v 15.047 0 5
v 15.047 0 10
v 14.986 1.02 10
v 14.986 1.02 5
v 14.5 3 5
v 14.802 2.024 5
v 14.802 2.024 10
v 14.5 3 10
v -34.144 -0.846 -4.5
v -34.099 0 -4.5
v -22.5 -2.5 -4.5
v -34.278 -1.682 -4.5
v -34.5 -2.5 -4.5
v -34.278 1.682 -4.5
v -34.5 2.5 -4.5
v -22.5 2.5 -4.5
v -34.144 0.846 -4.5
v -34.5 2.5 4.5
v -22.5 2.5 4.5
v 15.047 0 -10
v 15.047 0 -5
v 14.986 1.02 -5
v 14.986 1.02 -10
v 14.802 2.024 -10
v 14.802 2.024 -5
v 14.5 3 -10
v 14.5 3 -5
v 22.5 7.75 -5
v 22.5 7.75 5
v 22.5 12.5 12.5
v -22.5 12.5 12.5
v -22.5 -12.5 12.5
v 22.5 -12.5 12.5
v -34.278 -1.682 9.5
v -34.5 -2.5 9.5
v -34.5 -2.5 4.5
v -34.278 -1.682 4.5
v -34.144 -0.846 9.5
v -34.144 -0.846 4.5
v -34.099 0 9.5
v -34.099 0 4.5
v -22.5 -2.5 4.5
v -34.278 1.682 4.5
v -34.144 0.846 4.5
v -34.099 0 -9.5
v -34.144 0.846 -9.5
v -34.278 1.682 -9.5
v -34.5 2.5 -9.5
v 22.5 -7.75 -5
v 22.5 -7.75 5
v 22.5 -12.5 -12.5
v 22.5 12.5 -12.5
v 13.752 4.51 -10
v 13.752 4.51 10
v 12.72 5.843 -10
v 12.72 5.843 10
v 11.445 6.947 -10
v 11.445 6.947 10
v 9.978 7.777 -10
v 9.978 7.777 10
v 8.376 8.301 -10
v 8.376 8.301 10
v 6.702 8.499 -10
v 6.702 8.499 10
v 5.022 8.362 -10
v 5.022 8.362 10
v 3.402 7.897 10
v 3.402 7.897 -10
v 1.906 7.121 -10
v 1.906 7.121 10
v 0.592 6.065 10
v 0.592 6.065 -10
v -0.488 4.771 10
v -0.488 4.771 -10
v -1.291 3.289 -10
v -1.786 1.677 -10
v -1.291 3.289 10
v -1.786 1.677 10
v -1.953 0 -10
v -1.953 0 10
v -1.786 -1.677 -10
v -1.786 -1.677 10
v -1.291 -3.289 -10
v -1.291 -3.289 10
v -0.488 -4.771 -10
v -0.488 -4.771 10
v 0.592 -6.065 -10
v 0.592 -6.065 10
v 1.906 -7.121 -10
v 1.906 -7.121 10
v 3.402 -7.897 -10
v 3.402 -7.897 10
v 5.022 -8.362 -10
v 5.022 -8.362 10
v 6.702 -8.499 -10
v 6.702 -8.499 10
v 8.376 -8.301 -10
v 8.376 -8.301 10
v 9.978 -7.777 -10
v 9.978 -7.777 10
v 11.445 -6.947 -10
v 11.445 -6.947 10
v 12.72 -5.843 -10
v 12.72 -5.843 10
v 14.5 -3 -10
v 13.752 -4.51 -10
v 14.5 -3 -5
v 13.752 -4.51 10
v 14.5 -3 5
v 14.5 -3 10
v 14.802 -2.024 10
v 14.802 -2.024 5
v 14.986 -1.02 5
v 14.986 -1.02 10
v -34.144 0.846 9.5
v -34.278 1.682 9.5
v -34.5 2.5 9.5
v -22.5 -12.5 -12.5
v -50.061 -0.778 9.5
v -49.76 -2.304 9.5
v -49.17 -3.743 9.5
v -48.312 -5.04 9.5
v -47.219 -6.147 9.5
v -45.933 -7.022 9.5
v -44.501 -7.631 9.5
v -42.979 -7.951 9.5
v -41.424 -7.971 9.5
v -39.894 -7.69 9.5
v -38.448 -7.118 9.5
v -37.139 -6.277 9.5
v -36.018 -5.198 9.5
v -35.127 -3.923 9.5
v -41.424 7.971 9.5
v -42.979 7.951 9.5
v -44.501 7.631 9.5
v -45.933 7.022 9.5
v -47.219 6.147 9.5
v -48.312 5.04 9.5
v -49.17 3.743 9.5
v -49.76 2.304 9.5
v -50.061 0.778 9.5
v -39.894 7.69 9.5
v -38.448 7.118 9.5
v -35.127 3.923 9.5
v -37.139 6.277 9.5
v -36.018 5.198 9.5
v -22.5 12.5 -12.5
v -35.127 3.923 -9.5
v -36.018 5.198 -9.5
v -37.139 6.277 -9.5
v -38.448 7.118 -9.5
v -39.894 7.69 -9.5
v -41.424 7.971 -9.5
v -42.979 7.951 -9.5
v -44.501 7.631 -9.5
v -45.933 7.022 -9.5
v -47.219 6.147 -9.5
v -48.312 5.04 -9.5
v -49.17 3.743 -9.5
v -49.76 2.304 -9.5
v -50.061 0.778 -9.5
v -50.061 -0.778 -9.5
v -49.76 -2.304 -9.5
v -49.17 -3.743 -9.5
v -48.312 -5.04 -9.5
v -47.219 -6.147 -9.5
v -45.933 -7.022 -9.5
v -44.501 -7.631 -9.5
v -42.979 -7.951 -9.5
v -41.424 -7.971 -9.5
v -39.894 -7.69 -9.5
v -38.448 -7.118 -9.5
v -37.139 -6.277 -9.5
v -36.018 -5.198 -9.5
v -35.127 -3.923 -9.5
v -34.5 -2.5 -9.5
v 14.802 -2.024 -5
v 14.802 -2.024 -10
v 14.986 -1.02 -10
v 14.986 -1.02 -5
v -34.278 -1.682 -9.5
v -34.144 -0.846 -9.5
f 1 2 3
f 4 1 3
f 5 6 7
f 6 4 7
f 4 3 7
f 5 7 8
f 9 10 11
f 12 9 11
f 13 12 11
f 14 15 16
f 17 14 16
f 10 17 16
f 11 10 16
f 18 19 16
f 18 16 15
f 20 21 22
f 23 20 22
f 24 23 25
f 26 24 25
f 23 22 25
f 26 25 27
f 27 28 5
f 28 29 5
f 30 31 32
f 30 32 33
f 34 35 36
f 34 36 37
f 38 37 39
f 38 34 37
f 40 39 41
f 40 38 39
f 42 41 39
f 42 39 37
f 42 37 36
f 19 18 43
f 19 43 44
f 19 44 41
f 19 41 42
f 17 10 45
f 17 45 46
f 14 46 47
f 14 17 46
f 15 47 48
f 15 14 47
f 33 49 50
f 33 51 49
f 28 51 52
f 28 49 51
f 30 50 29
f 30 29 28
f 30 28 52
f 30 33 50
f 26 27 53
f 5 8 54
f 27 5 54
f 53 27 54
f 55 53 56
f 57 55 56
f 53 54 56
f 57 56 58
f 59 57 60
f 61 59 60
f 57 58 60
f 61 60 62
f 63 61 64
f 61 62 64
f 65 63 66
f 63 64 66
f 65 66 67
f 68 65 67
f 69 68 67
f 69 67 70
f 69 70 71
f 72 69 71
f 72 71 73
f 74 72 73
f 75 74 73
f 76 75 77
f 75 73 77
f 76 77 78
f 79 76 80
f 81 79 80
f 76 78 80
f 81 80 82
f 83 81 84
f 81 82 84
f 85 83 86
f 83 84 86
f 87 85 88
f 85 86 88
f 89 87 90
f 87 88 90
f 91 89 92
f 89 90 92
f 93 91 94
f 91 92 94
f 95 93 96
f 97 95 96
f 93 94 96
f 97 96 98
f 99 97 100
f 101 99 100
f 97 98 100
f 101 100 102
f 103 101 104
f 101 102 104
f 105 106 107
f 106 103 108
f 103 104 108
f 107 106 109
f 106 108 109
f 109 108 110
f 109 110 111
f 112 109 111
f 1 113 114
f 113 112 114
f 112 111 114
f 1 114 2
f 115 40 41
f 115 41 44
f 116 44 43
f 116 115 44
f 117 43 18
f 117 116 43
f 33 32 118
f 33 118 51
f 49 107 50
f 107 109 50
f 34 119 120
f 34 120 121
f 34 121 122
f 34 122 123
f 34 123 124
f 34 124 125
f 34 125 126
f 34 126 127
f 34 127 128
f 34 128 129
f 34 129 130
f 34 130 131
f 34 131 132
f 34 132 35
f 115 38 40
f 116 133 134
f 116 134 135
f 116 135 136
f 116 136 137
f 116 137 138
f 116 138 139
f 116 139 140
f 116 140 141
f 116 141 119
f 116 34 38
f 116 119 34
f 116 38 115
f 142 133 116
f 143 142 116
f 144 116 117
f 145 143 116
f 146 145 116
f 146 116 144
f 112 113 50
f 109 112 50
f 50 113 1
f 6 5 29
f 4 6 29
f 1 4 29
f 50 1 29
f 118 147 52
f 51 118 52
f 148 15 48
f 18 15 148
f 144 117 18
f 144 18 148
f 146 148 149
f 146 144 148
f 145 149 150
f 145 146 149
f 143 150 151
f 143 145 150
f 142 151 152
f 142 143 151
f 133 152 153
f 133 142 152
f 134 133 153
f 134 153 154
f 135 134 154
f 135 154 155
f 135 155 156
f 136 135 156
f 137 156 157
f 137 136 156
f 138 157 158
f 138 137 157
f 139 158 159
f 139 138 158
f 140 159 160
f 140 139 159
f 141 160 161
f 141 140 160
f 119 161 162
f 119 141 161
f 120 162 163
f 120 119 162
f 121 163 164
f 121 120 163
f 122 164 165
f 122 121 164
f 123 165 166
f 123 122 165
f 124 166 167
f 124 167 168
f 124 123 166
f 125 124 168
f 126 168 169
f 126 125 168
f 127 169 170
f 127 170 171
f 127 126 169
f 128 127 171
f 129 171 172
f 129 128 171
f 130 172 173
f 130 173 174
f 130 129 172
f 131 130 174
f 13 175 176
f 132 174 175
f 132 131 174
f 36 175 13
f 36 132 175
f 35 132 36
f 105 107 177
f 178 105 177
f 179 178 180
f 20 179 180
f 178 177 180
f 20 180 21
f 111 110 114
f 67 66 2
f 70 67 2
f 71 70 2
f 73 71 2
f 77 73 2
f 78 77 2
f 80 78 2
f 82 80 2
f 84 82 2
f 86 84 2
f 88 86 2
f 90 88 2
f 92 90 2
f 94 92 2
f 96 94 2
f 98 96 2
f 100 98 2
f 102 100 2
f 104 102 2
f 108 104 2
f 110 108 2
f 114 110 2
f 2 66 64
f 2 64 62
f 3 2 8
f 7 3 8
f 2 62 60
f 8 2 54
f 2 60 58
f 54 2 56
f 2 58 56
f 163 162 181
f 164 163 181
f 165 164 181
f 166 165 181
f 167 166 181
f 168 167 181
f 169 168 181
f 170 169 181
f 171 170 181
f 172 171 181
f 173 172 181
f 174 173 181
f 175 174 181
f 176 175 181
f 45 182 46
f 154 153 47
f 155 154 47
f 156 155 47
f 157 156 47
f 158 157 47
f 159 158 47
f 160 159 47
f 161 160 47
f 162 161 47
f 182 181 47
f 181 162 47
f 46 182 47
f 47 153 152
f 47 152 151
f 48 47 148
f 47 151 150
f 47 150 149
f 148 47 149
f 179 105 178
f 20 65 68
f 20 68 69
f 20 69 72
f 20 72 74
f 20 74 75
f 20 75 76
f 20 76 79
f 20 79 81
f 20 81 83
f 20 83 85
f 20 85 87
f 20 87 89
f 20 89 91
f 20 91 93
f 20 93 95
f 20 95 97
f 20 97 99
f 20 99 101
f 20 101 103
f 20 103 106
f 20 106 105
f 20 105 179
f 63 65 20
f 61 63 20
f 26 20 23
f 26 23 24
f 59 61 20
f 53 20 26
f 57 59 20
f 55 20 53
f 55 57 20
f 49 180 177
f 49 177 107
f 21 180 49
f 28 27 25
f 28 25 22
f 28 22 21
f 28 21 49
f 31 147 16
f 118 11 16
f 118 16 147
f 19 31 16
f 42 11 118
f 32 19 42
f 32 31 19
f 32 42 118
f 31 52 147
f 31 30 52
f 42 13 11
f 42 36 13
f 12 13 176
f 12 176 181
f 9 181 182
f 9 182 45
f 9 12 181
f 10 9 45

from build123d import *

# Parameters (mm, degrees)
F1_DEPTH = 12.5
F2_DEPTH = 10
F3_DEPTH = 4.5
F4_DEPTH = 9.5
F5_DEPTH = 5


with BuildPart() as f1:
    # F0 (on Top) → F1 (new body, symmetric)
    with BuildSketch(Plane.XY):
        with BuildLine():
            Line((22.5, 12.5), (-22.5, 12.5))
            Line((-22.5, 12.5), (-22.5, 2.5))
            Line((-22.5, 2.5), (-22.5, -2.5))
            Line((-22.5, -2.5), (-22.5, -12.5))
            Line((-22.5, -12.5), (22.5, -12.5))
            Line((22.5, -12.5), (22.5, -7.75))
            Line((22.5, -7.75), (14.5, -3))
            ThreePointArc((14.5, -3), (-1.952987, 0), (14.5, 3))
            Line((14.5, 3), (22.5, 7.75))
            Line((22.5, 7.75), (22.5, 12.5))
        make_face()
        with BuildLine():
            ThreePointArc((15.047013, 0), (14.909142, 1.524731), (14.5, 3))
            ThreePointArc((14.5, 3), (-1.952987, 0), (14.5, -3))
            ThreePointArc((14.5, -3), (14.909142, -1.524731), (15.047013, 0))
        make_face()
        Polygon((22.5, -7.75), (22.5, -3), (14.5, -3), align=None)
        with BuildLine():
            Line((22.5, -3), (22.5, 3))
            Line((22.5, 3), (14.5, 3))
            ThreePointArc((14.5, 3), (14.909142, 1.524731), (15.047013, 0))
            ThreePointArc((15.047013, 0), (14.909142, -1.524731), (14.5, -3))
            Line((14.5, -3), (22.5, -3))
        make_face()
        Polygon((22.5, 3), (22.5, 7.75), (14.5, 3), align=None)
    extrude(amount=F1_DEPTH, both=True)

    # F0 (on Top) → F2 (cut, symmetric)
    with BuildSketch(Plane.XY):
        with BuildLine():
            ThreePointArc((15.047013, 0), (14.909142, 1.524731), (14.5, 3))
            ThreePointArc((14.5, 3), (-1.952987, 0), (14.5, -3))
            ThreePointArc((14.5, -3), (14.909142, -1.524731), (15.047013, 0))
        make_face()
    extrude(amount=F2_DEPTH, both=True, mode=Mode.SUBTRACT)

    # F0 (on Top) → F3 (join, symmetric)
    with BuildSketch(Plane.XY):
        with BuildLine():
            Line((-22.5, -2.5), (-22.5, 2.5))
            Line((-22.5, 2.5), (-34.5, 2.5))
            ThreePointArc((-34.5, 2.5), (-34.200142, 1.265951), (-34.099342, 0))
            ThreePointArc((-34.099342, 0), (-34.200142, -1.265951), (-34.5, -2.5))
            Line((-34.5, -2.5), (-22.5, -2.5))
        make_face()
    extrude(amount=F3_DEPTH, both=True)

    # F0 (on Top) → F4 (join, symmetric)
    with BuildSketch(Plane.XY):
        with BuildLine():
            ThreePointArc((-34.099342, 0), (-34.200142, 1.265951), (-34.5, 2.5))
            ThreePointArc((-34.5, 2.5), (-50.099342, 0), (-34.5, -2.5))
            ThreePointArc((-34.5, -2.5), (-34.200142, -1.265951), (-34.099342, 0))
        make_face()
    extrude(amount=F4_DEPTH, both=True)

    # F0 (on Top) → F5 (cut, symmetric)
    with BuildSketch(Plane.XY):
        Polygon((22.5, 3), (22.5, 7.75), (14.5, 3), align=None)
        with BuildLine():
            Line((22.5, -3), (22.5, 3))
            Line((22.5, 3), (14.5, 3))
            ThreePointArc((14.5, 3), (14.909142, 1.524731), (15.047013, 0))
            ThreePointArc((15.047013, 0), (14.909142, -1.524731), (14.5, -3))
            Line((14.5, -3), (22.5, -3))
        make_face()
        Polygon((22.5, -7.75), (22.5, -3), (14.5, -3), align=None)
    extrude(amount=F5_DEPTH, both=True, mode=Mode.SUBTRACT)


solid = f1.part
